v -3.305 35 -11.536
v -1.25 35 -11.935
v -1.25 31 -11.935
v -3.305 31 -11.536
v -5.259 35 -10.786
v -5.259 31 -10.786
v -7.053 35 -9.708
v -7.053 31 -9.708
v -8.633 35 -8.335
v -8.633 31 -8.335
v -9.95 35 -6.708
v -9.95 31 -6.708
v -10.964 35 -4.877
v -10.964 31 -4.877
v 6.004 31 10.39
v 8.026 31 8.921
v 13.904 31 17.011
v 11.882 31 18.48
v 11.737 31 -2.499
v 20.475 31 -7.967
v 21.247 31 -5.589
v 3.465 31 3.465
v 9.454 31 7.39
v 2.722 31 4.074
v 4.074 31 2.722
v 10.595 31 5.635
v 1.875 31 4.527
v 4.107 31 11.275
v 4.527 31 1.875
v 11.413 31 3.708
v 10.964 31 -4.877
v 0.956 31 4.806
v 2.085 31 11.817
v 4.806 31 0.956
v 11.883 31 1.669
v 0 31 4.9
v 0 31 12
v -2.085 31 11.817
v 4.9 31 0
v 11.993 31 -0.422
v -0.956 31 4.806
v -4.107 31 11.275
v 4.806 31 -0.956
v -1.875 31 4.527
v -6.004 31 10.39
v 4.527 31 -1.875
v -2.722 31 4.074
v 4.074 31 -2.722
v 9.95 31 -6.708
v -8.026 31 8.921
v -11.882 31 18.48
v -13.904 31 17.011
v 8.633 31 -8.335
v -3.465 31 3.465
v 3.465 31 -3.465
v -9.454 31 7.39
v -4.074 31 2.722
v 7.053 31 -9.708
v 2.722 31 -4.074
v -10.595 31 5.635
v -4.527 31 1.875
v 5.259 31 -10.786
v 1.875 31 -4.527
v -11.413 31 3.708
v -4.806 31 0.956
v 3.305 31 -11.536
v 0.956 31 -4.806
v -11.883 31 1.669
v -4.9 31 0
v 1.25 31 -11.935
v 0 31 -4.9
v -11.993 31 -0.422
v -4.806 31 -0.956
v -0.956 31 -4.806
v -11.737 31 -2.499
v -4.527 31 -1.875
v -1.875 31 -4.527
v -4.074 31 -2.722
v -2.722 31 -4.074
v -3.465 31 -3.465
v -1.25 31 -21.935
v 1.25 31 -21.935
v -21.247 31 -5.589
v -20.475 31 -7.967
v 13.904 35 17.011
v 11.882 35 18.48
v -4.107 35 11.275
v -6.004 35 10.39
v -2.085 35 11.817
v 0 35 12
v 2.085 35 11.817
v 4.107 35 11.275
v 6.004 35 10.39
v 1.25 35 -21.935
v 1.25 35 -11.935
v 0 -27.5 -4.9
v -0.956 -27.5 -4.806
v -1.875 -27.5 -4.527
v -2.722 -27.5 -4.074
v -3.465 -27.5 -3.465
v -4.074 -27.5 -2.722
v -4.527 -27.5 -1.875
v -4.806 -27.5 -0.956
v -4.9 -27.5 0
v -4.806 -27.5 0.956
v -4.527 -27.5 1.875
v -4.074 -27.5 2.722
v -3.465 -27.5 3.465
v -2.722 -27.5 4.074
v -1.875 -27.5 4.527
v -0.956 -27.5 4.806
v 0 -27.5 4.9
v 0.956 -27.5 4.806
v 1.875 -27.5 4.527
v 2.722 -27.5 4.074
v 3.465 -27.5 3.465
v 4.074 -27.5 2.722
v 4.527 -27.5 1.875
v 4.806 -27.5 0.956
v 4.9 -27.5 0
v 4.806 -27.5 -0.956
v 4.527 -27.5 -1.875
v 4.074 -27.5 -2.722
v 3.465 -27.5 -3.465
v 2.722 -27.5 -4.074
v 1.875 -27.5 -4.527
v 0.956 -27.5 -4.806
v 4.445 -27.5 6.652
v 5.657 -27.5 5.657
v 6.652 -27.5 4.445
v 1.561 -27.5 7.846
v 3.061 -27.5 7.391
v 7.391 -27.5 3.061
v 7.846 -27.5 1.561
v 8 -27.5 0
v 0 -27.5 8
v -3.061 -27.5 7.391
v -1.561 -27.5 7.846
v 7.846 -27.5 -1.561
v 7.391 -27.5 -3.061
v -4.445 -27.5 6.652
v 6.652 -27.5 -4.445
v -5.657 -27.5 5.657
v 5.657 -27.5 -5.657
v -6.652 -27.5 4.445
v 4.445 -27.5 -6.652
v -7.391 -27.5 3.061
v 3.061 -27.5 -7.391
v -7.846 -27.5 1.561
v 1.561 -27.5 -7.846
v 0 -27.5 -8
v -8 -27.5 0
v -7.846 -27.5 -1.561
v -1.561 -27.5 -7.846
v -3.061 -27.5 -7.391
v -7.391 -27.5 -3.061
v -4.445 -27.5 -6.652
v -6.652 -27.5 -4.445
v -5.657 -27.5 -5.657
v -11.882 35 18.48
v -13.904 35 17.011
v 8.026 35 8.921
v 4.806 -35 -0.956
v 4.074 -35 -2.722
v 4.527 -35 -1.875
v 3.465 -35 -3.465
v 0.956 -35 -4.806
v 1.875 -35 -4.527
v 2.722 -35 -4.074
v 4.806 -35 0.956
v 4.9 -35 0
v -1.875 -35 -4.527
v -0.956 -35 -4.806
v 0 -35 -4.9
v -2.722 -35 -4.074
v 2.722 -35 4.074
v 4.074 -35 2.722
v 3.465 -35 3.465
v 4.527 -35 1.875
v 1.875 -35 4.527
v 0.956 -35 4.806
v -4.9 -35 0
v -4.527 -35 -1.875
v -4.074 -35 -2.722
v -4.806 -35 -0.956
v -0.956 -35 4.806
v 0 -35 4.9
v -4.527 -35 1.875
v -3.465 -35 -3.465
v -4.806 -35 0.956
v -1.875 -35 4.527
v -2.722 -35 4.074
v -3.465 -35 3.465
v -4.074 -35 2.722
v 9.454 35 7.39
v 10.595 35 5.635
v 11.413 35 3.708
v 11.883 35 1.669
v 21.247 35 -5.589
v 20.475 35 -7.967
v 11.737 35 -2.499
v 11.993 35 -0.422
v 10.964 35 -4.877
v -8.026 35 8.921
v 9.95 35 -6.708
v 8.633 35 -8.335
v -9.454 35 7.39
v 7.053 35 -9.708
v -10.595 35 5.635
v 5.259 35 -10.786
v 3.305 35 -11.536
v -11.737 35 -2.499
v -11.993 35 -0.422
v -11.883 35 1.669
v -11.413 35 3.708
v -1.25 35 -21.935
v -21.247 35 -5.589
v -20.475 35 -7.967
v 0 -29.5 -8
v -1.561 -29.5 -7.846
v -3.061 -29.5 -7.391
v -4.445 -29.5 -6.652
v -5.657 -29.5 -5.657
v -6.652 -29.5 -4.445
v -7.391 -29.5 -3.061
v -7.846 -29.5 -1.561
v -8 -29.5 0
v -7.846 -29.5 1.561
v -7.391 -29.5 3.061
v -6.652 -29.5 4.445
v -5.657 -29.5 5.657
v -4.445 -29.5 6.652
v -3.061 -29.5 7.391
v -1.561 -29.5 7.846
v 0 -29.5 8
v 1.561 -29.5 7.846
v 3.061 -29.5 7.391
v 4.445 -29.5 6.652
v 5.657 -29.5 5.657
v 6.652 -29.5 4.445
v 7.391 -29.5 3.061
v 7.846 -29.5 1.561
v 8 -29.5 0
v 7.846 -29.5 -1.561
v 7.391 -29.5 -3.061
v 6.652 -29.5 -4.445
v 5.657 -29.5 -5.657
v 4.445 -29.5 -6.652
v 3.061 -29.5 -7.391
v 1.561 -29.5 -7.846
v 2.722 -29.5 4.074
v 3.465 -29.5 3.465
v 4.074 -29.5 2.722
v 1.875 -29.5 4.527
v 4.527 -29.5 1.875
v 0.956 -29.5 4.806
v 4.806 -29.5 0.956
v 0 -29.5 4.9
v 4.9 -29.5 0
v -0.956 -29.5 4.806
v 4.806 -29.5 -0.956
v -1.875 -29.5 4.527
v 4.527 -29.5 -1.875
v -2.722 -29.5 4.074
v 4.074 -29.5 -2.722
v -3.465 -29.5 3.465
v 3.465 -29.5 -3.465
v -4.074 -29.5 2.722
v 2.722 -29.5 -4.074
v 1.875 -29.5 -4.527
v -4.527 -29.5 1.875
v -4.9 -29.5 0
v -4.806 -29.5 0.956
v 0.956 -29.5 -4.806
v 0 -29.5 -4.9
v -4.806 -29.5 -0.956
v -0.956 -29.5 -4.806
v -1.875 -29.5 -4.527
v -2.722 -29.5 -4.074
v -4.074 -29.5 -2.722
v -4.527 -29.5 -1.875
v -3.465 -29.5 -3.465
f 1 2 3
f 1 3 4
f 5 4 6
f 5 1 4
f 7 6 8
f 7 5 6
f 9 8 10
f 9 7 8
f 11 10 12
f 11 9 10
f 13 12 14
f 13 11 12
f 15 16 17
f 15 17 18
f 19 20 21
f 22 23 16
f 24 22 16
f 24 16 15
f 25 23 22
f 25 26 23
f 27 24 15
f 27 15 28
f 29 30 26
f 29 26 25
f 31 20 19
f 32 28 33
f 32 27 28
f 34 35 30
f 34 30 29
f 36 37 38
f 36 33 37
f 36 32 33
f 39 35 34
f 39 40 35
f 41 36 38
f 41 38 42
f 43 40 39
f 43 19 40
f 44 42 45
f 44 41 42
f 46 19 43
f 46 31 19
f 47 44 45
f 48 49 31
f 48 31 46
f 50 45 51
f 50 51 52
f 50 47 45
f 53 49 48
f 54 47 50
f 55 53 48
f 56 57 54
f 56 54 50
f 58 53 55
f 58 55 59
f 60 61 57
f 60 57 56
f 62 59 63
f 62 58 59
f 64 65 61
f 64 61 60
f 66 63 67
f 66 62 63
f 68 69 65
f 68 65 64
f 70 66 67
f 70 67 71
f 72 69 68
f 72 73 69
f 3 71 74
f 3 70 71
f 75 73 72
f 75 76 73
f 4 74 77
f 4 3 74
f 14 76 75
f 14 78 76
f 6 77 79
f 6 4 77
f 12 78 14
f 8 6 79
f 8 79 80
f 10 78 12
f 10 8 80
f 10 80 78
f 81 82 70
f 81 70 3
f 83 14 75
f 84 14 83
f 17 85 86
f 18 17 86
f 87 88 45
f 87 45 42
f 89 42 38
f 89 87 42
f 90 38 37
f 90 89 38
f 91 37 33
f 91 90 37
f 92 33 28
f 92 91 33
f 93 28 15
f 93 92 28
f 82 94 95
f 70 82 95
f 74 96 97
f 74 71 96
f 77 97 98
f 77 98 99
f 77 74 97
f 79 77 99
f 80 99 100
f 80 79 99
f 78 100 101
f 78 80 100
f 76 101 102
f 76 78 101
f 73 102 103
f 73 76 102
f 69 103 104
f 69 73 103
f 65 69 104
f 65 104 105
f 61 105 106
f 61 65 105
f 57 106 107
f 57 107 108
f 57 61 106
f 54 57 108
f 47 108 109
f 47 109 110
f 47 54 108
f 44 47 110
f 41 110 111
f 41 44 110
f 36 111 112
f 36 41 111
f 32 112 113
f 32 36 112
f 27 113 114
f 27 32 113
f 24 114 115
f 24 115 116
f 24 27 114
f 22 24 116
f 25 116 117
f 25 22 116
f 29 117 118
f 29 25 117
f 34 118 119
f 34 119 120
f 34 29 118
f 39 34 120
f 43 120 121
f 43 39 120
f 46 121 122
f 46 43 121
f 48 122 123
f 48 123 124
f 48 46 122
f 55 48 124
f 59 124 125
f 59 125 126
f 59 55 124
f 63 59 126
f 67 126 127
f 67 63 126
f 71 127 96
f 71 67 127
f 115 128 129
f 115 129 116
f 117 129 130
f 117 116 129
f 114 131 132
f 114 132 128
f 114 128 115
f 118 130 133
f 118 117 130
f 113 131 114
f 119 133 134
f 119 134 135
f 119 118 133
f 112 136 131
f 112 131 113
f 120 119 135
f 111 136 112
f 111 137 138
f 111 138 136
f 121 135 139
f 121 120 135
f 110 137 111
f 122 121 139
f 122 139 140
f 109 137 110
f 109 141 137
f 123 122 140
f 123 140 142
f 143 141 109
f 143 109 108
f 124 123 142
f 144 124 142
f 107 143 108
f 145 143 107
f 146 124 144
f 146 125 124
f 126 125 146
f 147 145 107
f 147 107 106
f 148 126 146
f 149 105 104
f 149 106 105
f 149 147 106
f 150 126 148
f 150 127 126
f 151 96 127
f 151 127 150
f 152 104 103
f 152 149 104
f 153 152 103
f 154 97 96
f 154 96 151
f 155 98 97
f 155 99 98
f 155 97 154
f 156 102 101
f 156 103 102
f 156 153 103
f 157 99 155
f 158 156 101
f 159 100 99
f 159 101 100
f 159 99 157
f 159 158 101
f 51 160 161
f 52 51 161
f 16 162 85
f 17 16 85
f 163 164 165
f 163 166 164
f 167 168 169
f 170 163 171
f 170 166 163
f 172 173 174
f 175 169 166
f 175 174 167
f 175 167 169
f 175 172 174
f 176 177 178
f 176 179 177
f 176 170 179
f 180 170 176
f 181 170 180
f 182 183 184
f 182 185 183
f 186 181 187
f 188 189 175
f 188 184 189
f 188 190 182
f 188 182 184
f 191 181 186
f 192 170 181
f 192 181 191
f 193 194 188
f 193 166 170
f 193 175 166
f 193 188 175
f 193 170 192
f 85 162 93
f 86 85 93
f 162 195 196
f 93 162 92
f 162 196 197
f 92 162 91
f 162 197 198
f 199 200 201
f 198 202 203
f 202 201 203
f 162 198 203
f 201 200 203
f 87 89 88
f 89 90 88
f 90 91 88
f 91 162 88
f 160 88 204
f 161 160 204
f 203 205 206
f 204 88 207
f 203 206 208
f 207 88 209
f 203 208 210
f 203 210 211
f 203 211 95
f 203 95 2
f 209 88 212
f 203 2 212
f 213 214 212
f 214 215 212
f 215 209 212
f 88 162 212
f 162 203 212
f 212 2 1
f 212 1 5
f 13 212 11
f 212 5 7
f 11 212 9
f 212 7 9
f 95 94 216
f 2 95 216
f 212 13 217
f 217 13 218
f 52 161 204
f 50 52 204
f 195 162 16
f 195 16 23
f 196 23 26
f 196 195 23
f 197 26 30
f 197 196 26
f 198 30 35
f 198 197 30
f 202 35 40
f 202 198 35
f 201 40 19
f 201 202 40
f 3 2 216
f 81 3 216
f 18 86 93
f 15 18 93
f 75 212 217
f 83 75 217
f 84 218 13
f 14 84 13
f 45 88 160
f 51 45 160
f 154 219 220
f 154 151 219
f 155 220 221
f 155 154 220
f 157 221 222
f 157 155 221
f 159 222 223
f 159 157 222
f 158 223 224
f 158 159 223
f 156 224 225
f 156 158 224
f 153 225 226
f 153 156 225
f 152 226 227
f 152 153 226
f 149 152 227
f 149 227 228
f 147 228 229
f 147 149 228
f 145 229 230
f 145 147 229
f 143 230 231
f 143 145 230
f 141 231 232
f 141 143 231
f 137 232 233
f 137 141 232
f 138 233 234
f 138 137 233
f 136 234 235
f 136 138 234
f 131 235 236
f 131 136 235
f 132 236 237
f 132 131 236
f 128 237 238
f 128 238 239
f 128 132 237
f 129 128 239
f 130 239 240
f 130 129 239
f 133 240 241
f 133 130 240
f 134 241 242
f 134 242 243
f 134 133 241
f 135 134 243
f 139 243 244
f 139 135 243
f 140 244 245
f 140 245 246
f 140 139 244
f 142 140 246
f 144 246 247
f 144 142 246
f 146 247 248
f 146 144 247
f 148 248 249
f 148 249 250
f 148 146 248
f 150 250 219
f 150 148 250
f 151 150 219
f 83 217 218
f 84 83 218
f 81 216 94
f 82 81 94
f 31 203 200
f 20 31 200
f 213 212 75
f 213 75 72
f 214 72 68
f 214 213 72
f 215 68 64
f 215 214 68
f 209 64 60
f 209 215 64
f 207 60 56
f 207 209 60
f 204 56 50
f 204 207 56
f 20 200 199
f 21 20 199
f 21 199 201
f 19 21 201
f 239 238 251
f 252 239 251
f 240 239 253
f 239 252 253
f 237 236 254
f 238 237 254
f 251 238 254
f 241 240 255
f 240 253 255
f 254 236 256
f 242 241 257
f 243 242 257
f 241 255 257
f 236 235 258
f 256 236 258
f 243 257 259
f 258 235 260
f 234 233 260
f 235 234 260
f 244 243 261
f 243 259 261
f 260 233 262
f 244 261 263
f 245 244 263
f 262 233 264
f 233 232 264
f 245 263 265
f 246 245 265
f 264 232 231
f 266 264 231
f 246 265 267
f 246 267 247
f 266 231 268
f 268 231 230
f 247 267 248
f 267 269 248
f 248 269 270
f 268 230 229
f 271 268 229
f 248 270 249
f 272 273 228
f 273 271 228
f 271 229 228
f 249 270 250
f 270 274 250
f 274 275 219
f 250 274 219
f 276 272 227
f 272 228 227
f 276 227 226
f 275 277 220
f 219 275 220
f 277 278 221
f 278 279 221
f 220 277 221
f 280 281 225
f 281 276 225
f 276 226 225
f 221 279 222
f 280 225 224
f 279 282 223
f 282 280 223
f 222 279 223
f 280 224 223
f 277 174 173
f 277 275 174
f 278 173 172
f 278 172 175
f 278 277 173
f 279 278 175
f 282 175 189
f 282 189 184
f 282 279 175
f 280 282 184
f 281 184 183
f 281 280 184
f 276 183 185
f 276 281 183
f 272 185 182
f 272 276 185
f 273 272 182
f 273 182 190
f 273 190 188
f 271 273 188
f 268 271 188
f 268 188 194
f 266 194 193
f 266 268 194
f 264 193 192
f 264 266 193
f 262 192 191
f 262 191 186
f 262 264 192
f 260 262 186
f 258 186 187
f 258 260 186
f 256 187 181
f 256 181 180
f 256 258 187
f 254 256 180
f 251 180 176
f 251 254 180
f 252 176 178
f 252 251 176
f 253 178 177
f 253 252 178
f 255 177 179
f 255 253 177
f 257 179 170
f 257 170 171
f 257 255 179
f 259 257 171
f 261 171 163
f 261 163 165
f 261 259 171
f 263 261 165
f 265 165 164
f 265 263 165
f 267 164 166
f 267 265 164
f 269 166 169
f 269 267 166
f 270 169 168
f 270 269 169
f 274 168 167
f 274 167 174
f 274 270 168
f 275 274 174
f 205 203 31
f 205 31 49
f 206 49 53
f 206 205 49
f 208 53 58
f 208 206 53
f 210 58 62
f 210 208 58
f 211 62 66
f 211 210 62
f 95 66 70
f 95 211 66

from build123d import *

# Parameters (mm, degrees)
SKETCH1_W           = 3.1
SKETCH1_H           = 2
BOSS_EXTRUDE1_DEPTH = 4
CIRPATTERN1_COUNT   = 5


with BuildPart() as part:
    # Sketch1 → Revolve1 (revolve)
    with BuildSketch(Plane.XY, mode=Mode.PRIVATE) as revolve1_sk:
        Polygon((0, 35), (0, -35), (-4.9, -35), (-4.9, 31), (-12, 31), (-12, 35), align=None)
        with Locations((-6.45, -28.5)):
            Rectangle(SKETCH1_W, SKETCH1_H)
    revolve(revolve1_sk.sketch.rotate(Axis((0, -35, 0), (0, 1, 0)), 270), axis=Axis((0, -35, 0), (0, 1, 0)))

    # Sketch2 → Boss-Extrude1 (add)
    with BuildSketch(Plane(origin=(0, 35, 0), x_dir=(1, 0, 0), z_dir=(0, 1, 0))):
        with BuildLine():
            Line((-1.25, 11.934718262), (-1.25, 21.934718262))
            Line((-1.25, 21.934718262), (1.25, 21.934718262))
            Line((1.25, 21.934718262), (1.25, 11.934718262))
            ThreePointArc((1.25, 11.934718262), (0, 12), (-1.25, 11.934718262))
        make_face()
    boss_extrude1 = extrude(amount=-BOSS_EXTRUDE1_DEPTH)

    # CirPattern1: Boss-Extrude1 ×5 about axis
    cirpattern1_axis = Axis((0, 0, 0), (0, 1, 0))
    for i in range(1, CIRPATTERN1_COUNT):
        add(boss_extrude1.rotate(cirpattern1_axis, i * 360 / CIRPATTERN1_COUNT))


solid = part.part
